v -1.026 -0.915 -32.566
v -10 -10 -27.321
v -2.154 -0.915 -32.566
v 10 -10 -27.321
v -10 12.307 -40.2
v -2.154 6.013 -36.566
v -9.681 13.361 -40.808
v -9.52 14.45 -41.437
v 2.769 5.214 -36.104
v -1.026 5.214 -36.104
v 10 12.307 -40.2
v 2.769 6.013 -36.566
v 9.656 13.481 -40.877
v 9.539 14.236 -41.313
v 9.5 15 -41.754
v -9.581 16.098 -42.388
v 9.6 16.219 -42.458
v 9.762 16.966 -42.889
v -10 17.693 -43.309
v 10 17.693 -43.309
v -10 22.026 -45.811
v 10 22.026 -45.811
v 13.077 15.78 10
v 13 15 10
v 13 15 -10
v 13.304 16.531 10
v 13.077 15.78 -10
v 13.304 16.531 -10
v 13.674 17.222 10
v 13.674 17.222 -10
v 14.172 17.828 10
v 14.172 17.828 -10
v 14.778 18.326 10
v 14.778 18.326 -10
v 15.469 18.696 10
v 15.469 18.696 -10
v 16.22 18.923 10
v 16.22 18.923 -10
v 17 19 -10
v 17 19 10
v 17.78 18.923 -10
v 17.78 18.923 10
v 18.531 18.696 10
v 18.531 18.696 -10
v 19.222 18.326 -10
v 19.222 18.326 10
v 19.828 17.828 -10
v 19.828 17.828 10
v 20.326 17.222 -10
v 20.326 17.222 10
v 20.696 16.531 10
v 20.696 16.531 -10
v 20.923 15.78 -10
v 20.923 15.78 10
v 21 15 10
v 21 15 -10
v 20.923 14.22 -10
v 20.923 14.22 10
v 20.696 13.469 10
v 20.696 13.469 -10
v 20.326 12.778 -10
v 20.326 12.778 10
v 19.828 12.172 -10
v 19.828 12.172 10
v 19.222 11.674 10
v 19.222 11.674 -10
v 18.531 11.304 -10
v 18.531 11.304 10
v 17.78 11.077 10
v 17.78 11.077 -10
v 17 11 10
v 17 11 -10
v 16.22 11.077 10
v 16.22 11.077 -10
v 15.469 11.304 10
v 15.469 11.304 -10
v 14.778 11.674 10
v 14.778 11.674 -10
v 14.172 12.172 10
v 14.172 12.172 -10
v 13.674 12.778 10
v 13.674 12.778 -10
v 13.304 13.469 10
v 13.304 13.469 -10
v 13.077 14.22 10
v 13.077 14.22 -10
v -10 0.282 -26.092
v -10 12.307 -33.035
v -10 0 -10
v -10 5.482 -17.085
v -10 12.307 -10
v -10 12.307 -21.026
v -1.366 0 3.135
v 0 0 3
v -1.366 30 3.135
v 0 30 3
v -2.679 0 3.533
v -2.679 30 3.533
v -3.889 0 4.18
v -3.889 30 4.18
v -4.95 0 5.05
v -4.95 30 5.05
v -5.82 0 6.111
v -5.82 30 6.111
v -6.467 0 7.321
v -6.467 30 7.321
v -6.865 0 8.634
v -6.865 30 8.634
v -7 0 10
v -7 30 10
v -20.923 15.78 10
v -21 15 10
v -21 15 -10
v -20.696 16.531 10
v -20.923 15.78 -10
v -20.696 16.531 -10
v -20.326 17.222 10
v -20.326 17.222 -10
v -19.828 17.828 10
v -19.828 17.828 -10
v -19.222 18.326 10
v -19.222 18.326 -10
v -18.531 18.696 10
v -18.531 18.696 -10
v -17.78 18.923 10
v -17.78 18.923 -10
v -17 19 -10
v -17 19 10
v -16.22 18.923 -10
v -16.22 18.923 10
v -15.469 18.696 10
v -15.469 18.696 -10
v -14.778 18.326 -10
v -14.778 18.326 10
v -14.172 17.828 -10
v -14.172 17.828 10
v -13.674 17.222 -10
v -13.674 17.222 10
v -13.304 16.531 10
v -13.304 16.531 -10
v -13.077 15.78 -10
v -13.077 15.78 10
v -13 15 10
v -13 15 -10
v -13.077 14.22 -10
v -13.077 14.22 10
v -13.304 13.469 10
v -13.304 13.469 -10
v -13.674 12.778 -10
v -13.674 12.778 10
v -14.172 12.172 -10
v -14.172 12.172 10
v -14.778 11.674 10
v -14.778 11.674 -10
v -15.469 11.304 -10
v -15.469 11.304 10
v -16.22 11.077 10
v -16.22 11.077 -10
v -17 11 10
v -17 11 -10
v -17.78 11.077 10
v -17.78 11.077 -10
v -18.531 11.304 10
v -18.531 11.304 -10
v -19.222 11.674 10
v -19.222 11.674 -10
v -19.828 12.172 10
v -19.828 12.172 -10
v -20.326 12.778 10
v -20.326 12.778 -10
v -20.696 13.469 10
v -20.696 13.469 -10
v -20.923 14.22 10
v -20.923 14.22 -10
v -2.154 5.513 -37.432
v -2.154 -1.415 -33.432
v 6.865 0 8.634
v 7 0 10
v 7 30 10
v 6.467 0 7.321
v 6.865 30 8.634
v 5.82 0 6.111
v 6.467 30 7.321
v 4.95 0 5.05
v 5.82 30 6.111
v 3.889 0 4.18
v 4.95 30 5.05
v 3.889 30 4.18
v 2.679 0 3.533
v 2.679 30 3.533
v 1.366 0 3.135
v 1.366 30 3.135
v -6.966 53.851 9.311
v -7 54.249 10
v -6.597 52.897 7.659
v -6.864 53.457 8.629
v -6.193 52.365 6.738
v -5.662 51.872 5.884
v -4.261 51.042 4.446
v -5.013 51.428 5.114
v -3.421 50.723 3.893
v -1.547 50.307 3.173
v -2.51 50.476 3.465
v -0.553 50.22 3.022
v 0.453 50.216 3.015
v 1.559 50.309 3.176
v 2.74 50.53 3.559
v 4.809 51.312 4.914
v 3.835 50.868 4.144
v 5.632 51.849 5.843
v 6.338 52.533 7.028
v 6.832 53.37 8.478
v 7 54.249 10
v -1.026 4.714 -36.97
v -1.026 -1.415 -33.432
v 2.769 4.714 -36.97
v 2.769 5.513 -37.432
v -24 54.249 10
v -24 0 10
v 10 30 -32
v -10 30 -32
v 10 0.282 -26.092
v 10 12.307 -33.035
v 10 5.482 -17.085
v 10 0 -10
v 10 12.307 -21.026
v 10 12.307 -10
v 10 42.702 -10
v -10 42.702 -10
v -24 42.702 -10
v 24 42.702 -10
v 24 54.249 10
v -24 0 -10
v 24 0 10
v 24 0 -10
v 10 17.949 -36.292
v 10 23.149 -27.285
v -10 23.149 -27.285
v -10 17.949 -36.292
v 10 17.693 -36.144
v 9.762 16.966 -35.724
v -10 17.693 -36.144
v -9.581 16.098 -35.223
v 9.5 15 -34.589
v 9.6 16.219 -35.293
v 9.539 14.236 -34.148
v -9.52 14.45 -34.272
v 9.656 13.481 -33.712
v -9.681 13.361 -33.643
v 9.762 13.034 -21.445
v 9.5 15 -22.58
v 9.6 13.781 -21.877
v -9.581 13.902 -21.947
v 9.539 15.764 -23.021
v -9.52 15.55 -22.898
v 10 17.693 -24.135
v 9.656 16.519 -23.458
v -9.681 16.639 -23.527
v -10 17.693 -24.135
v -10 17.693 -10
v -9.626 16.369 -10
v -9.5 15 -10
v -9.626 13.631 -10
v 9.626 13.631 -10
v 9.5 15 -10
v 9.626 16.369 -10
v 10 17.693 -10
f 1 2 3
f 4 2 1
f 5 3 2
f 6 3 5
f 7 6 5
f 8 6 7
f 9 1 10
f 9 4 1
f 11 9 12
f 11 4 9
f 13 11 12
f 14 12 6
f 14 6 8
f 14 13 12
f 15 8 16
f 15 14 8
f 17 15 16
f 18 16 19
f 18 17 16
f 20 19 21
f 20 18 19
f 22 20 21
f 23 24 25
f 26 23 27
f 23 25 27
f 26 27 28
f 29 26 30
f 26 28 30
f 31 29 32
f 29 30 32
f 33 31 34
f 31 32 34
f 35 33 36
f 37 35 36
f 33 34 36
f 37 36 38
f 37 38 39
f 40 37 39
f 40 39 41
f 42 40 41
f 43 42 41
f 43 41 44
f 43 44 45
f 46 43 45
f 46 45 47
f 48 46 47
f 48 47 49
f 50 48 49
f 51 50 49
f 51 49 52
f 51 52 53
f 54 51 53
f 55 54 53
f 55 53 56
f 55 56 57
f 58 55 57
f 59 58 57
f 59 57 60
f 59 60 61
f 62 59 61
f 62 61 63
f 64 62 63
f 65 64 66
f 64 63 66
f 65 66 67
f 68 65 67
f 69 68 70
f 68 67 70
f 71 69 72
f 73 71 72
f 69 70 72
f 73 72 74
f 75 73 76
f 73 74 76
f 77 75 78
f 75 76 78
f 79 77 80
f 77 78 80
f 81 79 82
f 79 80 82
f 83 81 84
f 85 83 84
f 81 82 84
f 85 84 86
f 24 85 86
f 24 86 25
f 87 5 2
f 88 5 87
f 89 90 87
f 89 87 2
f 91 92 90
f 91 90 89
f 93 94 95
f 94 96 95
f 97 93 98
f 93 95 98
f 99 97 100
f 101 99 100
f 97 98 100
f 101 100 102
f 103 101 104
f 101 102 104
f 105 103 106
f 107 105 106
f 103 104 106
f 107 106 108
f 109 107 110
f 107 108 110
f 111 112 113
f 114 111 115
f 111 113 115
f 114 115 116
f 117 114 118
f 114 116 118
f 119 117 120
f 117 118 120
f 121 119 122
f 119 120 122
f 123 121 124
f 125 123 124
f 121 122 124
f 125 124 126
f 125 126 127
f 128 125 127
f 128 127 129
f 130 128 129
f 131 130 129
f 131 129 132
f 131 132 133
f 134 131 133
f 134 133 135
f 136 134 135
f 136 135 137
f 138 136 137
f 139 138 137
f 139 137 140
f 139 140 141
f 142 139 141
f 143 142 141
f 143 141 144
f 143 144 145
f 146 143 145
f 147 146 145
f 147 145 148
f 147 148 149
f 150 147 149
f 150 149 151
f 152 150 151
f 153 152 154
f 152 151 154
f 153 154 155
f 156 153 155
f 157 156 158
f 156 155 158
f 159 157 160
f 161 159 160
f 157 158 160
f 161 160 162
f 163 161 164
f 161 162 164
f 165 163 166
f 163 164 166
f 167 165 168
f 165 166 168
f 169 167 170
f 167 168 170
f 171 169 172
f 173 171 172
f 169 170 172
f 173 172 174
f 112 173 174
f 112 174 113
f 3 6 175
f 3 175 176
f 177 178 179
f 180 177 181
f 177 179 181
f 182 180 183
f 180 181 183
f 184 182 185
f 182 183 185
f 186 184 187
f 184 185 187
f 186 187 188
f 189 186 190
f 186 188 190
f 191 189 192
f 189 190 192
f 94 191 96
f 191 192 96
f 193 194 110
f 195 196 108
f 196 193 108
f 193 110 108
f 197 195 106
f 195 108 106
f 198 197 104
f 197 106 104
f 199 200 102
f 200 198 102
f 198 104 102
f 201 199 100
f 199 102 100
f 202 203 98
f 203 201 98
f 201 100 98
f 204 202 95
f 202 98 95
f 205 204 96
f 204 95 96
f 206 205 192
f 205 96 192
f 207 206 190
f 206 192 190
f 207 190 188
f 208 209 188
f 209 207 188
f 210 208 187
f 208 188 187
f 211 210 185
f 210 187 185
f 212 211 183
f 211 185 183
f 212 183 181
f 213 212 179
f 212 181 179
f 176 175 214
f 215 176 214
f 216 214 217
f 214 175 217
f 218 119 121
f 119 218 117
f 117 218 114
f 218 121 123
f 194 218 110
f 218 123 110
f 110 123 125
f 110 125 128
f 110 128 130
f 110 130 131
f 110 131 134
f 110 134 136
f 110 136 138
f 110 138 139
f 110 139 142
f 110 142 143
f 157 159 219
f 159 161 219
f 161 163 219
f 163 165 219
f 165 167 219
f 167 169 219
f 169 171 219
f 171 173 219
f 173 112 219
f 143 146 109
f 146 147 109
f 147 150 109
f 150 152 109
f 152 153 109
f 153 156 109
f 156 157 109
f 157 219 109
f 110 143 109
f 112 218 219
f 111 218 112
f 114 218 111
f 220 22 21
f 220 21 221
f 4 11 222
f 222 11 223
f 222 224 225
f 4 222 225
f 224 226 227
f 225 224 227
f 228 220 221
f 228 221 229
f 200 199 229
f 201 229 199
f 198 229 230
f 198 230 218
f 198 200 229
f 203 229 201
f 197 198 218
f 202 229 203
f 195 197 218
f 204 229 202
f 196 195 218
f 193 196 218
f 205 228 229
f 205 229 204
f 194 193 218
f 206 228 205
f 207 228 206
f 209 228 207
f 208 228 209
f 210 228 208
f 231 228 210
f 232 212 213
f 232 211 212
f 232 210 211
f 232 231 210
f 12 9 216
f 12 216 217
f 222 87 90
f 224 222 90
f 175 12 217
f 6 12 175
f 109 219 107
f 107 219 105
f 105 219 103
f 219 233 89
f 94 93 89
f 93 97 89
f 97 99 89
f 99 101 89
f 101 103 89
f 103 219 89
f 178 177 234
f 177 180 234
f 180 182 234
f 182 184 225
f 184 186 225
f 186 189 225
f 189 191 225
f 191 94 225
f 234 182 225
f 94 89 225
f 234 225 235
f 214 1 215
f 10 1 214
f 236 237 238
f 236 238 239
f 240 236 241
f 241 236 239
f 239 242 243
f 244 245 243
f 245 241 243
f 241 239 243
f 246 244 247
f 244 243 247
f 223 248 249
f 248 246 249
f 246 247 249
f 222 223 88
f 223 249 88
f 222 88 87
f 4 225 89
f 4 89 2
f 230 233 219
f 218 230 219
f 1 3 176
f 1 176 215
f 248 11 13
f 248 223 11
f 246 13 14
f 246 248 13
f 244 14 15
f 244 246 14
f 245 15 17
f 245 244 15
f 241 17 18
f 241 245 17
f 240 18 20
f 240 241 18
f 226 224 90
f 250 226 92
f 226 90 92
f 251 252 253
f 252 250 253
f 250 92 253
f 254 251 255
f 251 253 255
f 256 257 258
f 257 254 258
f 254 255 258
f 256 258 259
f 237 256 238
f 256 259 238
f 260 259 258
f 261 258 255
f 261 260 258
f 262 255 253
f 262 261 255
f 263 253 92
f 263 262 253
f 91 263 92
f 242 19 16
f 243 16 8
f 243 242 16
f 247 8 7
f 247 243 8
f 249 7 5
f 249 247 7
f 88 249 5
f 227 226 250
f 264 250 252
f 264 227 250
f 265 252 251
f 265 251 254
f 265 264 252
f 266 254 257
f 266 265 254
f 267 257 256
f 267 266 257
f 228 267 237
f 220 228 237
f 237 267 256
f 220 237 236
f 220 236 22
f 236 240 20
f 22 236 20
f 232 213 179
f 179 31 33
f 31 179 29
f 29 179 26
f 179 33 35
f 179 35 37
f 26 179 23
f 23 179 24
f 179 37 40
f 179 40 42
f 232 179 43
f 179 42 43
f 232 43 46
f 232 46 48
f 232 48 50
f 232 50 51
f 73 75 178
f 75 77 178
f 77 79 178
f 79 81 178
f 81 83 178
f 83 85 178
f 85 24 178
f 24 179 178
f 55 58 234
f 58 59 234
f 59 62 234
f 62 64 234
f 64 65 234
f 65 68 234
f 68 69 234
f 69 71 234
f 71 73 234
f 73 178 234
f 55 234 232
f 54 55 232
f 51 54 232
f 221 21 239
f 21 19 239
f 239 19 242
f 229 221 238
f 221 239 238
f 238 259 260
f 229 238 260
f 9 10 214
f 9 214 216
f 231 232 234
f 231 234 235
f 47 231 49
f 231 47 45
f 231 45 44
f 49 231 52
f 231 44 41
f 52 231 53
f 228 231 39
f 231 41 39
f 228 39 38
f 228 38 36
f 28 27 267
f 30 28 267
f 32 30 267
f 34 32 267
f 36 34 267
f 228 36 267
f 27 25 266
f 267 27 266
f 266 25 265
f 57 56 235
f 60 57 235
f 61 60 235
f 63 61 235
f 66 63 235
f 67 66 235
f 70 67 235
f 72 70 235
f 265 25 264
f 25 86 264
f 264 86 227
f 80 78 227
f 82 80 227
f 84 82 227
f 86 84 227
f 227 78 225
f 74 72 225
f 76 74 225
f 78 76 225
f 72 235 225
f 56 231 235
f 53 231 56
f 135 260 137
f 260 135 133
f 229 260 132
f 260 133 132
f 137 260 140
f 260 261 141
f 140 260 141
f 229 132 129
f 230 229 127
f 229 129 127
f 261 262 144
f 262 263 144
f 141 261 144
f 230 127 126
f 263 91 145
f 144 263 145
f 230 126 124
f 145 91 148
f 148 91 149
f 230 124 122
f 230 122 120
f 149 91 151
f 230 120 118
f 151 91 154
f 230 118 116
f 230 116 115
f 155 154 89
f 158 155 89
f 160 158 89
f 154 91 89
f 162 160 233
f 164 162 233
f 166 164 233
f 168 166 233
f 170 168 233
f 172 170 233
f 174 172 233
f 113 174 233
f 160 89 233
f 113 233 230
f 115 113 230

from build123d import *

# Parameters (mm, degrees)
SKETCH_1_W              = 48
SKETCH_1_H              = 20
EXTRUDE_1_DEPTH         = 30
SKETCH_2_W              = 14
SKETCH_2_H              = 30
CUT_EXTRUDE_1_DEPTH     = 7
EXTRUDE_2_DEPTH         = 48
CUT_EXTRUDE_2_DEPTH     = 14
CUT_EXTRUDE_3_DEPTH     = 14
CUT_EXTRUDE_4_DEPTH     = 65.456478054
SKETCH_13_R             = 4
CUT_EXTRUDE_5_DEPTH     = 53.52066051
SKETCH_14_R             = 4
CUT_EXTRUDE_6_DEPTH     = 53.52066051
FILLET_1_R              = 7
EXTRUDE_5_DEPTH         = 1
SKETCH_20_R             = 7.5
CUT_EXTRUDE_8_DEPTH     = 53.52066051
BOSS_EXTRUDE1_DEPTH     = 25
CUT_EXTRUDE1_DEPTH      = 80.244164221
CUT_EXTRUDE1_DEPTH_BACK = 80.244164221


with BuildPart() as part:
    # Эскиз1 → Бобышка-Вытянуть1 (new body)
    with BuildSketch(Plane(origin=(0, 0, 0), x_dir=(1, 0, 0), z_dir=(0, 1, 0))):
        Rectangle(SKETCH_1_W, SKETCH_1_H)
    extrude(amount=EXTRUDE_1_DEPTH)

    # Эскиз2 → Вырез-Вытянуть1 (cut)
    with BuildSketch(Plane.XY.offset(10)):
        with Locations((0, 15)):
            Rectangle(SKETCH_2_W, SKETCH_2_H)
    extrude(amount=-CUT_EXTRUDE_1_DEPTH, mode=Mode.SUBTRACT)

    # Эскиз7 → Бобышка-Вытянуть2 (add)
    with BuildSketch(Plane(origin=(24, 0, 0), x_dir=(0, 0, -1), z_dir=(1, 0, 0))):
        Polygon((10, 0), (27.320508076, -10), (45.810889132, 22.026279442), (32, 30), (10, 30), align=None)
    extrude(amount=-EXTRUDE_2_DEPTH)

    # Эскиз8 → Вырез-Вытянуть2 (cut)
    with BuildSketch(Plane(origin=(24, 0, 0), x_dir=(0, 0, -1), z_dir=(1, 0, 0))):
        Polygon((10, 0), (10, 30), (32, 30), (45.810889132, 22.026279442), (27.320508076, -10), align=None)
    extrude(amount=-CUT_EXTRUDE_2_DEPTH, mode=Mode.SUBTRACT)

    # Эскиз9 → Вырез-Вытянуть3 (cut)
    with BuildSketch(Plane.ZY.offset(24)):
        Polygon((-10, 0), (-10, 30), (-32, 30), (-45.810889132, 22.026279442), (-27.320508076, -10), align=None)
    extrude(amount=-CUT_EXTRUDE_3_DEPTH, mode=Mode.SUBTRACT)

    # Эскиз11 → Вырез-Вытянуть4 (cut, through all)
    with BuildSketch(Plane.ZY.offset(10)):
        Polygon((-17.085266521, 5.482226936), (-27.285266521, 23.149145173), (-36.291930721, 17.949145173), (-26.091930721, 0.282226936), align=None)
    extrude(amount=-CUT_EXTRUDE_4_DEPTH, mode=Mode.SUBTRACT)

    # Эскиз13 → Вырез-Вытянуть5 (cut, through all)
    with BuildSketch(Plane(origin=(0, 0, -10), x_dir=(-1, 0, 0), z_dir=(0, 0, -1))):
        with Locations((17, 15)):
            Circle(SKETCH_13_R)
    extrude(amount=-CUT_EXTRUDE_5_DEPTH, mode=Mode.SUBTRACT)

    # Эскиз14 → Вырез-Вытянуть6 (cut, through all)
    with BuildSketch(Plane(origin=(0, 0, -10), x_dir=(-1, 0, 0), z_dir=(0, 0, -1))):
        with Locations((-17, 15)):
            Circle(SKETCH_14_R)
    extrude(amount=-CUT_EXTRUDE_6_DEPTH, mode=Mode.SUBTRACT)

    # Скругление1
    fillet_1_edges = [part.edges().sort_by_distance(p)[0] for p in [
        (-7, 15, 3),
        (7, 15, 3),
    ]]
    fillet(fillet_1_edges, radius=FILLET_1_R - 0.0001)  # a hair under: the kernel refuses the full size

    # Эскиз18 → Бобышка-Вытянуть5 (add)
    with BuildSketch(Plane(origin=(0, -14.330127019, -24.820508076), x_dir=(-1, 0, 0), z_dir=(0, -0.4999999999999885, -0.8660254037844454))):
        Polygon((2.153846154, 23.490381057), (2.153846154, 15.490381057), (1.025641026, 15.490381057), (1.025641026, 22.567304134), (-2.769230769, 22.567304134), (-2.769230769, 23.490381057), align=None)
    extrude(amount=EXTRUDE_5_DEPTH)

    # Эскиз20 → Вырез-Вытянуть8 (cut, through all)
    with BuildSketch(Plane(origin=(0, 0, -10), x_dir=(-1, 0, 0), z_dir=(0, 0, -1))):
        with Locations((-17, 15)):
            Circle(SKETCH_20_R)
        with Locations((17, 15)):
            Circle(SKETCH_20_R)
    extrude(amount=CUT_EXTRUDE_8_DEPTH, mode=Mode.SUBTRACT)

    # Sketch3 → Boss-Extrude1 (add)
    with BuildSketch(Plane(origin=(0, 30, 0), x_dir=(1, 0, 0), z_dir=(0, 1, 0))):
        with BuildLine():
            Line((7, -10), (24, -10))
            Line((24, -10), (24, 10))
            Line((24, 10), (10, 10))
            Line((10, 10), (10, 32))
            Line((10, 32), (-10, 32))
            Line((-10, 32), (-10, 10))
            Line((-10, 10), (-24, 10))
            Line((-24, 10), (-24, -10))
            Line((-24, -10), (-7, -10))
            ThreePointArc((-7, -10), (0, -3), (7, -10))
        make_face()
    extrude(amount=BOSS_EXTRUDE1_DEPTH)

    # Sketch4 → Cut-Extrude1 (cut, two sides: drawn at the far end of the back side and taken through both)
    with BuildSketch(Plane.ZY.offset(10).offset(-CUT_EXTRUDE1_DEPTH_BACK)):
        Polygon((-251.050138341, -96.468656337), (-45.810889132, 22.026279442), (35.63071017, 69.046608722), (240.869959379, 187.541544501), (3.880087821, 598.020042918), (-488.040009899, 314.00984208), align=None)
    extrude(amount=CUT_EXTRUDE1_DEPTH + CUT_EXTRUDE1_DEPTH_BACK, mode=Mode.SUBTRACT)


solid = part.part
